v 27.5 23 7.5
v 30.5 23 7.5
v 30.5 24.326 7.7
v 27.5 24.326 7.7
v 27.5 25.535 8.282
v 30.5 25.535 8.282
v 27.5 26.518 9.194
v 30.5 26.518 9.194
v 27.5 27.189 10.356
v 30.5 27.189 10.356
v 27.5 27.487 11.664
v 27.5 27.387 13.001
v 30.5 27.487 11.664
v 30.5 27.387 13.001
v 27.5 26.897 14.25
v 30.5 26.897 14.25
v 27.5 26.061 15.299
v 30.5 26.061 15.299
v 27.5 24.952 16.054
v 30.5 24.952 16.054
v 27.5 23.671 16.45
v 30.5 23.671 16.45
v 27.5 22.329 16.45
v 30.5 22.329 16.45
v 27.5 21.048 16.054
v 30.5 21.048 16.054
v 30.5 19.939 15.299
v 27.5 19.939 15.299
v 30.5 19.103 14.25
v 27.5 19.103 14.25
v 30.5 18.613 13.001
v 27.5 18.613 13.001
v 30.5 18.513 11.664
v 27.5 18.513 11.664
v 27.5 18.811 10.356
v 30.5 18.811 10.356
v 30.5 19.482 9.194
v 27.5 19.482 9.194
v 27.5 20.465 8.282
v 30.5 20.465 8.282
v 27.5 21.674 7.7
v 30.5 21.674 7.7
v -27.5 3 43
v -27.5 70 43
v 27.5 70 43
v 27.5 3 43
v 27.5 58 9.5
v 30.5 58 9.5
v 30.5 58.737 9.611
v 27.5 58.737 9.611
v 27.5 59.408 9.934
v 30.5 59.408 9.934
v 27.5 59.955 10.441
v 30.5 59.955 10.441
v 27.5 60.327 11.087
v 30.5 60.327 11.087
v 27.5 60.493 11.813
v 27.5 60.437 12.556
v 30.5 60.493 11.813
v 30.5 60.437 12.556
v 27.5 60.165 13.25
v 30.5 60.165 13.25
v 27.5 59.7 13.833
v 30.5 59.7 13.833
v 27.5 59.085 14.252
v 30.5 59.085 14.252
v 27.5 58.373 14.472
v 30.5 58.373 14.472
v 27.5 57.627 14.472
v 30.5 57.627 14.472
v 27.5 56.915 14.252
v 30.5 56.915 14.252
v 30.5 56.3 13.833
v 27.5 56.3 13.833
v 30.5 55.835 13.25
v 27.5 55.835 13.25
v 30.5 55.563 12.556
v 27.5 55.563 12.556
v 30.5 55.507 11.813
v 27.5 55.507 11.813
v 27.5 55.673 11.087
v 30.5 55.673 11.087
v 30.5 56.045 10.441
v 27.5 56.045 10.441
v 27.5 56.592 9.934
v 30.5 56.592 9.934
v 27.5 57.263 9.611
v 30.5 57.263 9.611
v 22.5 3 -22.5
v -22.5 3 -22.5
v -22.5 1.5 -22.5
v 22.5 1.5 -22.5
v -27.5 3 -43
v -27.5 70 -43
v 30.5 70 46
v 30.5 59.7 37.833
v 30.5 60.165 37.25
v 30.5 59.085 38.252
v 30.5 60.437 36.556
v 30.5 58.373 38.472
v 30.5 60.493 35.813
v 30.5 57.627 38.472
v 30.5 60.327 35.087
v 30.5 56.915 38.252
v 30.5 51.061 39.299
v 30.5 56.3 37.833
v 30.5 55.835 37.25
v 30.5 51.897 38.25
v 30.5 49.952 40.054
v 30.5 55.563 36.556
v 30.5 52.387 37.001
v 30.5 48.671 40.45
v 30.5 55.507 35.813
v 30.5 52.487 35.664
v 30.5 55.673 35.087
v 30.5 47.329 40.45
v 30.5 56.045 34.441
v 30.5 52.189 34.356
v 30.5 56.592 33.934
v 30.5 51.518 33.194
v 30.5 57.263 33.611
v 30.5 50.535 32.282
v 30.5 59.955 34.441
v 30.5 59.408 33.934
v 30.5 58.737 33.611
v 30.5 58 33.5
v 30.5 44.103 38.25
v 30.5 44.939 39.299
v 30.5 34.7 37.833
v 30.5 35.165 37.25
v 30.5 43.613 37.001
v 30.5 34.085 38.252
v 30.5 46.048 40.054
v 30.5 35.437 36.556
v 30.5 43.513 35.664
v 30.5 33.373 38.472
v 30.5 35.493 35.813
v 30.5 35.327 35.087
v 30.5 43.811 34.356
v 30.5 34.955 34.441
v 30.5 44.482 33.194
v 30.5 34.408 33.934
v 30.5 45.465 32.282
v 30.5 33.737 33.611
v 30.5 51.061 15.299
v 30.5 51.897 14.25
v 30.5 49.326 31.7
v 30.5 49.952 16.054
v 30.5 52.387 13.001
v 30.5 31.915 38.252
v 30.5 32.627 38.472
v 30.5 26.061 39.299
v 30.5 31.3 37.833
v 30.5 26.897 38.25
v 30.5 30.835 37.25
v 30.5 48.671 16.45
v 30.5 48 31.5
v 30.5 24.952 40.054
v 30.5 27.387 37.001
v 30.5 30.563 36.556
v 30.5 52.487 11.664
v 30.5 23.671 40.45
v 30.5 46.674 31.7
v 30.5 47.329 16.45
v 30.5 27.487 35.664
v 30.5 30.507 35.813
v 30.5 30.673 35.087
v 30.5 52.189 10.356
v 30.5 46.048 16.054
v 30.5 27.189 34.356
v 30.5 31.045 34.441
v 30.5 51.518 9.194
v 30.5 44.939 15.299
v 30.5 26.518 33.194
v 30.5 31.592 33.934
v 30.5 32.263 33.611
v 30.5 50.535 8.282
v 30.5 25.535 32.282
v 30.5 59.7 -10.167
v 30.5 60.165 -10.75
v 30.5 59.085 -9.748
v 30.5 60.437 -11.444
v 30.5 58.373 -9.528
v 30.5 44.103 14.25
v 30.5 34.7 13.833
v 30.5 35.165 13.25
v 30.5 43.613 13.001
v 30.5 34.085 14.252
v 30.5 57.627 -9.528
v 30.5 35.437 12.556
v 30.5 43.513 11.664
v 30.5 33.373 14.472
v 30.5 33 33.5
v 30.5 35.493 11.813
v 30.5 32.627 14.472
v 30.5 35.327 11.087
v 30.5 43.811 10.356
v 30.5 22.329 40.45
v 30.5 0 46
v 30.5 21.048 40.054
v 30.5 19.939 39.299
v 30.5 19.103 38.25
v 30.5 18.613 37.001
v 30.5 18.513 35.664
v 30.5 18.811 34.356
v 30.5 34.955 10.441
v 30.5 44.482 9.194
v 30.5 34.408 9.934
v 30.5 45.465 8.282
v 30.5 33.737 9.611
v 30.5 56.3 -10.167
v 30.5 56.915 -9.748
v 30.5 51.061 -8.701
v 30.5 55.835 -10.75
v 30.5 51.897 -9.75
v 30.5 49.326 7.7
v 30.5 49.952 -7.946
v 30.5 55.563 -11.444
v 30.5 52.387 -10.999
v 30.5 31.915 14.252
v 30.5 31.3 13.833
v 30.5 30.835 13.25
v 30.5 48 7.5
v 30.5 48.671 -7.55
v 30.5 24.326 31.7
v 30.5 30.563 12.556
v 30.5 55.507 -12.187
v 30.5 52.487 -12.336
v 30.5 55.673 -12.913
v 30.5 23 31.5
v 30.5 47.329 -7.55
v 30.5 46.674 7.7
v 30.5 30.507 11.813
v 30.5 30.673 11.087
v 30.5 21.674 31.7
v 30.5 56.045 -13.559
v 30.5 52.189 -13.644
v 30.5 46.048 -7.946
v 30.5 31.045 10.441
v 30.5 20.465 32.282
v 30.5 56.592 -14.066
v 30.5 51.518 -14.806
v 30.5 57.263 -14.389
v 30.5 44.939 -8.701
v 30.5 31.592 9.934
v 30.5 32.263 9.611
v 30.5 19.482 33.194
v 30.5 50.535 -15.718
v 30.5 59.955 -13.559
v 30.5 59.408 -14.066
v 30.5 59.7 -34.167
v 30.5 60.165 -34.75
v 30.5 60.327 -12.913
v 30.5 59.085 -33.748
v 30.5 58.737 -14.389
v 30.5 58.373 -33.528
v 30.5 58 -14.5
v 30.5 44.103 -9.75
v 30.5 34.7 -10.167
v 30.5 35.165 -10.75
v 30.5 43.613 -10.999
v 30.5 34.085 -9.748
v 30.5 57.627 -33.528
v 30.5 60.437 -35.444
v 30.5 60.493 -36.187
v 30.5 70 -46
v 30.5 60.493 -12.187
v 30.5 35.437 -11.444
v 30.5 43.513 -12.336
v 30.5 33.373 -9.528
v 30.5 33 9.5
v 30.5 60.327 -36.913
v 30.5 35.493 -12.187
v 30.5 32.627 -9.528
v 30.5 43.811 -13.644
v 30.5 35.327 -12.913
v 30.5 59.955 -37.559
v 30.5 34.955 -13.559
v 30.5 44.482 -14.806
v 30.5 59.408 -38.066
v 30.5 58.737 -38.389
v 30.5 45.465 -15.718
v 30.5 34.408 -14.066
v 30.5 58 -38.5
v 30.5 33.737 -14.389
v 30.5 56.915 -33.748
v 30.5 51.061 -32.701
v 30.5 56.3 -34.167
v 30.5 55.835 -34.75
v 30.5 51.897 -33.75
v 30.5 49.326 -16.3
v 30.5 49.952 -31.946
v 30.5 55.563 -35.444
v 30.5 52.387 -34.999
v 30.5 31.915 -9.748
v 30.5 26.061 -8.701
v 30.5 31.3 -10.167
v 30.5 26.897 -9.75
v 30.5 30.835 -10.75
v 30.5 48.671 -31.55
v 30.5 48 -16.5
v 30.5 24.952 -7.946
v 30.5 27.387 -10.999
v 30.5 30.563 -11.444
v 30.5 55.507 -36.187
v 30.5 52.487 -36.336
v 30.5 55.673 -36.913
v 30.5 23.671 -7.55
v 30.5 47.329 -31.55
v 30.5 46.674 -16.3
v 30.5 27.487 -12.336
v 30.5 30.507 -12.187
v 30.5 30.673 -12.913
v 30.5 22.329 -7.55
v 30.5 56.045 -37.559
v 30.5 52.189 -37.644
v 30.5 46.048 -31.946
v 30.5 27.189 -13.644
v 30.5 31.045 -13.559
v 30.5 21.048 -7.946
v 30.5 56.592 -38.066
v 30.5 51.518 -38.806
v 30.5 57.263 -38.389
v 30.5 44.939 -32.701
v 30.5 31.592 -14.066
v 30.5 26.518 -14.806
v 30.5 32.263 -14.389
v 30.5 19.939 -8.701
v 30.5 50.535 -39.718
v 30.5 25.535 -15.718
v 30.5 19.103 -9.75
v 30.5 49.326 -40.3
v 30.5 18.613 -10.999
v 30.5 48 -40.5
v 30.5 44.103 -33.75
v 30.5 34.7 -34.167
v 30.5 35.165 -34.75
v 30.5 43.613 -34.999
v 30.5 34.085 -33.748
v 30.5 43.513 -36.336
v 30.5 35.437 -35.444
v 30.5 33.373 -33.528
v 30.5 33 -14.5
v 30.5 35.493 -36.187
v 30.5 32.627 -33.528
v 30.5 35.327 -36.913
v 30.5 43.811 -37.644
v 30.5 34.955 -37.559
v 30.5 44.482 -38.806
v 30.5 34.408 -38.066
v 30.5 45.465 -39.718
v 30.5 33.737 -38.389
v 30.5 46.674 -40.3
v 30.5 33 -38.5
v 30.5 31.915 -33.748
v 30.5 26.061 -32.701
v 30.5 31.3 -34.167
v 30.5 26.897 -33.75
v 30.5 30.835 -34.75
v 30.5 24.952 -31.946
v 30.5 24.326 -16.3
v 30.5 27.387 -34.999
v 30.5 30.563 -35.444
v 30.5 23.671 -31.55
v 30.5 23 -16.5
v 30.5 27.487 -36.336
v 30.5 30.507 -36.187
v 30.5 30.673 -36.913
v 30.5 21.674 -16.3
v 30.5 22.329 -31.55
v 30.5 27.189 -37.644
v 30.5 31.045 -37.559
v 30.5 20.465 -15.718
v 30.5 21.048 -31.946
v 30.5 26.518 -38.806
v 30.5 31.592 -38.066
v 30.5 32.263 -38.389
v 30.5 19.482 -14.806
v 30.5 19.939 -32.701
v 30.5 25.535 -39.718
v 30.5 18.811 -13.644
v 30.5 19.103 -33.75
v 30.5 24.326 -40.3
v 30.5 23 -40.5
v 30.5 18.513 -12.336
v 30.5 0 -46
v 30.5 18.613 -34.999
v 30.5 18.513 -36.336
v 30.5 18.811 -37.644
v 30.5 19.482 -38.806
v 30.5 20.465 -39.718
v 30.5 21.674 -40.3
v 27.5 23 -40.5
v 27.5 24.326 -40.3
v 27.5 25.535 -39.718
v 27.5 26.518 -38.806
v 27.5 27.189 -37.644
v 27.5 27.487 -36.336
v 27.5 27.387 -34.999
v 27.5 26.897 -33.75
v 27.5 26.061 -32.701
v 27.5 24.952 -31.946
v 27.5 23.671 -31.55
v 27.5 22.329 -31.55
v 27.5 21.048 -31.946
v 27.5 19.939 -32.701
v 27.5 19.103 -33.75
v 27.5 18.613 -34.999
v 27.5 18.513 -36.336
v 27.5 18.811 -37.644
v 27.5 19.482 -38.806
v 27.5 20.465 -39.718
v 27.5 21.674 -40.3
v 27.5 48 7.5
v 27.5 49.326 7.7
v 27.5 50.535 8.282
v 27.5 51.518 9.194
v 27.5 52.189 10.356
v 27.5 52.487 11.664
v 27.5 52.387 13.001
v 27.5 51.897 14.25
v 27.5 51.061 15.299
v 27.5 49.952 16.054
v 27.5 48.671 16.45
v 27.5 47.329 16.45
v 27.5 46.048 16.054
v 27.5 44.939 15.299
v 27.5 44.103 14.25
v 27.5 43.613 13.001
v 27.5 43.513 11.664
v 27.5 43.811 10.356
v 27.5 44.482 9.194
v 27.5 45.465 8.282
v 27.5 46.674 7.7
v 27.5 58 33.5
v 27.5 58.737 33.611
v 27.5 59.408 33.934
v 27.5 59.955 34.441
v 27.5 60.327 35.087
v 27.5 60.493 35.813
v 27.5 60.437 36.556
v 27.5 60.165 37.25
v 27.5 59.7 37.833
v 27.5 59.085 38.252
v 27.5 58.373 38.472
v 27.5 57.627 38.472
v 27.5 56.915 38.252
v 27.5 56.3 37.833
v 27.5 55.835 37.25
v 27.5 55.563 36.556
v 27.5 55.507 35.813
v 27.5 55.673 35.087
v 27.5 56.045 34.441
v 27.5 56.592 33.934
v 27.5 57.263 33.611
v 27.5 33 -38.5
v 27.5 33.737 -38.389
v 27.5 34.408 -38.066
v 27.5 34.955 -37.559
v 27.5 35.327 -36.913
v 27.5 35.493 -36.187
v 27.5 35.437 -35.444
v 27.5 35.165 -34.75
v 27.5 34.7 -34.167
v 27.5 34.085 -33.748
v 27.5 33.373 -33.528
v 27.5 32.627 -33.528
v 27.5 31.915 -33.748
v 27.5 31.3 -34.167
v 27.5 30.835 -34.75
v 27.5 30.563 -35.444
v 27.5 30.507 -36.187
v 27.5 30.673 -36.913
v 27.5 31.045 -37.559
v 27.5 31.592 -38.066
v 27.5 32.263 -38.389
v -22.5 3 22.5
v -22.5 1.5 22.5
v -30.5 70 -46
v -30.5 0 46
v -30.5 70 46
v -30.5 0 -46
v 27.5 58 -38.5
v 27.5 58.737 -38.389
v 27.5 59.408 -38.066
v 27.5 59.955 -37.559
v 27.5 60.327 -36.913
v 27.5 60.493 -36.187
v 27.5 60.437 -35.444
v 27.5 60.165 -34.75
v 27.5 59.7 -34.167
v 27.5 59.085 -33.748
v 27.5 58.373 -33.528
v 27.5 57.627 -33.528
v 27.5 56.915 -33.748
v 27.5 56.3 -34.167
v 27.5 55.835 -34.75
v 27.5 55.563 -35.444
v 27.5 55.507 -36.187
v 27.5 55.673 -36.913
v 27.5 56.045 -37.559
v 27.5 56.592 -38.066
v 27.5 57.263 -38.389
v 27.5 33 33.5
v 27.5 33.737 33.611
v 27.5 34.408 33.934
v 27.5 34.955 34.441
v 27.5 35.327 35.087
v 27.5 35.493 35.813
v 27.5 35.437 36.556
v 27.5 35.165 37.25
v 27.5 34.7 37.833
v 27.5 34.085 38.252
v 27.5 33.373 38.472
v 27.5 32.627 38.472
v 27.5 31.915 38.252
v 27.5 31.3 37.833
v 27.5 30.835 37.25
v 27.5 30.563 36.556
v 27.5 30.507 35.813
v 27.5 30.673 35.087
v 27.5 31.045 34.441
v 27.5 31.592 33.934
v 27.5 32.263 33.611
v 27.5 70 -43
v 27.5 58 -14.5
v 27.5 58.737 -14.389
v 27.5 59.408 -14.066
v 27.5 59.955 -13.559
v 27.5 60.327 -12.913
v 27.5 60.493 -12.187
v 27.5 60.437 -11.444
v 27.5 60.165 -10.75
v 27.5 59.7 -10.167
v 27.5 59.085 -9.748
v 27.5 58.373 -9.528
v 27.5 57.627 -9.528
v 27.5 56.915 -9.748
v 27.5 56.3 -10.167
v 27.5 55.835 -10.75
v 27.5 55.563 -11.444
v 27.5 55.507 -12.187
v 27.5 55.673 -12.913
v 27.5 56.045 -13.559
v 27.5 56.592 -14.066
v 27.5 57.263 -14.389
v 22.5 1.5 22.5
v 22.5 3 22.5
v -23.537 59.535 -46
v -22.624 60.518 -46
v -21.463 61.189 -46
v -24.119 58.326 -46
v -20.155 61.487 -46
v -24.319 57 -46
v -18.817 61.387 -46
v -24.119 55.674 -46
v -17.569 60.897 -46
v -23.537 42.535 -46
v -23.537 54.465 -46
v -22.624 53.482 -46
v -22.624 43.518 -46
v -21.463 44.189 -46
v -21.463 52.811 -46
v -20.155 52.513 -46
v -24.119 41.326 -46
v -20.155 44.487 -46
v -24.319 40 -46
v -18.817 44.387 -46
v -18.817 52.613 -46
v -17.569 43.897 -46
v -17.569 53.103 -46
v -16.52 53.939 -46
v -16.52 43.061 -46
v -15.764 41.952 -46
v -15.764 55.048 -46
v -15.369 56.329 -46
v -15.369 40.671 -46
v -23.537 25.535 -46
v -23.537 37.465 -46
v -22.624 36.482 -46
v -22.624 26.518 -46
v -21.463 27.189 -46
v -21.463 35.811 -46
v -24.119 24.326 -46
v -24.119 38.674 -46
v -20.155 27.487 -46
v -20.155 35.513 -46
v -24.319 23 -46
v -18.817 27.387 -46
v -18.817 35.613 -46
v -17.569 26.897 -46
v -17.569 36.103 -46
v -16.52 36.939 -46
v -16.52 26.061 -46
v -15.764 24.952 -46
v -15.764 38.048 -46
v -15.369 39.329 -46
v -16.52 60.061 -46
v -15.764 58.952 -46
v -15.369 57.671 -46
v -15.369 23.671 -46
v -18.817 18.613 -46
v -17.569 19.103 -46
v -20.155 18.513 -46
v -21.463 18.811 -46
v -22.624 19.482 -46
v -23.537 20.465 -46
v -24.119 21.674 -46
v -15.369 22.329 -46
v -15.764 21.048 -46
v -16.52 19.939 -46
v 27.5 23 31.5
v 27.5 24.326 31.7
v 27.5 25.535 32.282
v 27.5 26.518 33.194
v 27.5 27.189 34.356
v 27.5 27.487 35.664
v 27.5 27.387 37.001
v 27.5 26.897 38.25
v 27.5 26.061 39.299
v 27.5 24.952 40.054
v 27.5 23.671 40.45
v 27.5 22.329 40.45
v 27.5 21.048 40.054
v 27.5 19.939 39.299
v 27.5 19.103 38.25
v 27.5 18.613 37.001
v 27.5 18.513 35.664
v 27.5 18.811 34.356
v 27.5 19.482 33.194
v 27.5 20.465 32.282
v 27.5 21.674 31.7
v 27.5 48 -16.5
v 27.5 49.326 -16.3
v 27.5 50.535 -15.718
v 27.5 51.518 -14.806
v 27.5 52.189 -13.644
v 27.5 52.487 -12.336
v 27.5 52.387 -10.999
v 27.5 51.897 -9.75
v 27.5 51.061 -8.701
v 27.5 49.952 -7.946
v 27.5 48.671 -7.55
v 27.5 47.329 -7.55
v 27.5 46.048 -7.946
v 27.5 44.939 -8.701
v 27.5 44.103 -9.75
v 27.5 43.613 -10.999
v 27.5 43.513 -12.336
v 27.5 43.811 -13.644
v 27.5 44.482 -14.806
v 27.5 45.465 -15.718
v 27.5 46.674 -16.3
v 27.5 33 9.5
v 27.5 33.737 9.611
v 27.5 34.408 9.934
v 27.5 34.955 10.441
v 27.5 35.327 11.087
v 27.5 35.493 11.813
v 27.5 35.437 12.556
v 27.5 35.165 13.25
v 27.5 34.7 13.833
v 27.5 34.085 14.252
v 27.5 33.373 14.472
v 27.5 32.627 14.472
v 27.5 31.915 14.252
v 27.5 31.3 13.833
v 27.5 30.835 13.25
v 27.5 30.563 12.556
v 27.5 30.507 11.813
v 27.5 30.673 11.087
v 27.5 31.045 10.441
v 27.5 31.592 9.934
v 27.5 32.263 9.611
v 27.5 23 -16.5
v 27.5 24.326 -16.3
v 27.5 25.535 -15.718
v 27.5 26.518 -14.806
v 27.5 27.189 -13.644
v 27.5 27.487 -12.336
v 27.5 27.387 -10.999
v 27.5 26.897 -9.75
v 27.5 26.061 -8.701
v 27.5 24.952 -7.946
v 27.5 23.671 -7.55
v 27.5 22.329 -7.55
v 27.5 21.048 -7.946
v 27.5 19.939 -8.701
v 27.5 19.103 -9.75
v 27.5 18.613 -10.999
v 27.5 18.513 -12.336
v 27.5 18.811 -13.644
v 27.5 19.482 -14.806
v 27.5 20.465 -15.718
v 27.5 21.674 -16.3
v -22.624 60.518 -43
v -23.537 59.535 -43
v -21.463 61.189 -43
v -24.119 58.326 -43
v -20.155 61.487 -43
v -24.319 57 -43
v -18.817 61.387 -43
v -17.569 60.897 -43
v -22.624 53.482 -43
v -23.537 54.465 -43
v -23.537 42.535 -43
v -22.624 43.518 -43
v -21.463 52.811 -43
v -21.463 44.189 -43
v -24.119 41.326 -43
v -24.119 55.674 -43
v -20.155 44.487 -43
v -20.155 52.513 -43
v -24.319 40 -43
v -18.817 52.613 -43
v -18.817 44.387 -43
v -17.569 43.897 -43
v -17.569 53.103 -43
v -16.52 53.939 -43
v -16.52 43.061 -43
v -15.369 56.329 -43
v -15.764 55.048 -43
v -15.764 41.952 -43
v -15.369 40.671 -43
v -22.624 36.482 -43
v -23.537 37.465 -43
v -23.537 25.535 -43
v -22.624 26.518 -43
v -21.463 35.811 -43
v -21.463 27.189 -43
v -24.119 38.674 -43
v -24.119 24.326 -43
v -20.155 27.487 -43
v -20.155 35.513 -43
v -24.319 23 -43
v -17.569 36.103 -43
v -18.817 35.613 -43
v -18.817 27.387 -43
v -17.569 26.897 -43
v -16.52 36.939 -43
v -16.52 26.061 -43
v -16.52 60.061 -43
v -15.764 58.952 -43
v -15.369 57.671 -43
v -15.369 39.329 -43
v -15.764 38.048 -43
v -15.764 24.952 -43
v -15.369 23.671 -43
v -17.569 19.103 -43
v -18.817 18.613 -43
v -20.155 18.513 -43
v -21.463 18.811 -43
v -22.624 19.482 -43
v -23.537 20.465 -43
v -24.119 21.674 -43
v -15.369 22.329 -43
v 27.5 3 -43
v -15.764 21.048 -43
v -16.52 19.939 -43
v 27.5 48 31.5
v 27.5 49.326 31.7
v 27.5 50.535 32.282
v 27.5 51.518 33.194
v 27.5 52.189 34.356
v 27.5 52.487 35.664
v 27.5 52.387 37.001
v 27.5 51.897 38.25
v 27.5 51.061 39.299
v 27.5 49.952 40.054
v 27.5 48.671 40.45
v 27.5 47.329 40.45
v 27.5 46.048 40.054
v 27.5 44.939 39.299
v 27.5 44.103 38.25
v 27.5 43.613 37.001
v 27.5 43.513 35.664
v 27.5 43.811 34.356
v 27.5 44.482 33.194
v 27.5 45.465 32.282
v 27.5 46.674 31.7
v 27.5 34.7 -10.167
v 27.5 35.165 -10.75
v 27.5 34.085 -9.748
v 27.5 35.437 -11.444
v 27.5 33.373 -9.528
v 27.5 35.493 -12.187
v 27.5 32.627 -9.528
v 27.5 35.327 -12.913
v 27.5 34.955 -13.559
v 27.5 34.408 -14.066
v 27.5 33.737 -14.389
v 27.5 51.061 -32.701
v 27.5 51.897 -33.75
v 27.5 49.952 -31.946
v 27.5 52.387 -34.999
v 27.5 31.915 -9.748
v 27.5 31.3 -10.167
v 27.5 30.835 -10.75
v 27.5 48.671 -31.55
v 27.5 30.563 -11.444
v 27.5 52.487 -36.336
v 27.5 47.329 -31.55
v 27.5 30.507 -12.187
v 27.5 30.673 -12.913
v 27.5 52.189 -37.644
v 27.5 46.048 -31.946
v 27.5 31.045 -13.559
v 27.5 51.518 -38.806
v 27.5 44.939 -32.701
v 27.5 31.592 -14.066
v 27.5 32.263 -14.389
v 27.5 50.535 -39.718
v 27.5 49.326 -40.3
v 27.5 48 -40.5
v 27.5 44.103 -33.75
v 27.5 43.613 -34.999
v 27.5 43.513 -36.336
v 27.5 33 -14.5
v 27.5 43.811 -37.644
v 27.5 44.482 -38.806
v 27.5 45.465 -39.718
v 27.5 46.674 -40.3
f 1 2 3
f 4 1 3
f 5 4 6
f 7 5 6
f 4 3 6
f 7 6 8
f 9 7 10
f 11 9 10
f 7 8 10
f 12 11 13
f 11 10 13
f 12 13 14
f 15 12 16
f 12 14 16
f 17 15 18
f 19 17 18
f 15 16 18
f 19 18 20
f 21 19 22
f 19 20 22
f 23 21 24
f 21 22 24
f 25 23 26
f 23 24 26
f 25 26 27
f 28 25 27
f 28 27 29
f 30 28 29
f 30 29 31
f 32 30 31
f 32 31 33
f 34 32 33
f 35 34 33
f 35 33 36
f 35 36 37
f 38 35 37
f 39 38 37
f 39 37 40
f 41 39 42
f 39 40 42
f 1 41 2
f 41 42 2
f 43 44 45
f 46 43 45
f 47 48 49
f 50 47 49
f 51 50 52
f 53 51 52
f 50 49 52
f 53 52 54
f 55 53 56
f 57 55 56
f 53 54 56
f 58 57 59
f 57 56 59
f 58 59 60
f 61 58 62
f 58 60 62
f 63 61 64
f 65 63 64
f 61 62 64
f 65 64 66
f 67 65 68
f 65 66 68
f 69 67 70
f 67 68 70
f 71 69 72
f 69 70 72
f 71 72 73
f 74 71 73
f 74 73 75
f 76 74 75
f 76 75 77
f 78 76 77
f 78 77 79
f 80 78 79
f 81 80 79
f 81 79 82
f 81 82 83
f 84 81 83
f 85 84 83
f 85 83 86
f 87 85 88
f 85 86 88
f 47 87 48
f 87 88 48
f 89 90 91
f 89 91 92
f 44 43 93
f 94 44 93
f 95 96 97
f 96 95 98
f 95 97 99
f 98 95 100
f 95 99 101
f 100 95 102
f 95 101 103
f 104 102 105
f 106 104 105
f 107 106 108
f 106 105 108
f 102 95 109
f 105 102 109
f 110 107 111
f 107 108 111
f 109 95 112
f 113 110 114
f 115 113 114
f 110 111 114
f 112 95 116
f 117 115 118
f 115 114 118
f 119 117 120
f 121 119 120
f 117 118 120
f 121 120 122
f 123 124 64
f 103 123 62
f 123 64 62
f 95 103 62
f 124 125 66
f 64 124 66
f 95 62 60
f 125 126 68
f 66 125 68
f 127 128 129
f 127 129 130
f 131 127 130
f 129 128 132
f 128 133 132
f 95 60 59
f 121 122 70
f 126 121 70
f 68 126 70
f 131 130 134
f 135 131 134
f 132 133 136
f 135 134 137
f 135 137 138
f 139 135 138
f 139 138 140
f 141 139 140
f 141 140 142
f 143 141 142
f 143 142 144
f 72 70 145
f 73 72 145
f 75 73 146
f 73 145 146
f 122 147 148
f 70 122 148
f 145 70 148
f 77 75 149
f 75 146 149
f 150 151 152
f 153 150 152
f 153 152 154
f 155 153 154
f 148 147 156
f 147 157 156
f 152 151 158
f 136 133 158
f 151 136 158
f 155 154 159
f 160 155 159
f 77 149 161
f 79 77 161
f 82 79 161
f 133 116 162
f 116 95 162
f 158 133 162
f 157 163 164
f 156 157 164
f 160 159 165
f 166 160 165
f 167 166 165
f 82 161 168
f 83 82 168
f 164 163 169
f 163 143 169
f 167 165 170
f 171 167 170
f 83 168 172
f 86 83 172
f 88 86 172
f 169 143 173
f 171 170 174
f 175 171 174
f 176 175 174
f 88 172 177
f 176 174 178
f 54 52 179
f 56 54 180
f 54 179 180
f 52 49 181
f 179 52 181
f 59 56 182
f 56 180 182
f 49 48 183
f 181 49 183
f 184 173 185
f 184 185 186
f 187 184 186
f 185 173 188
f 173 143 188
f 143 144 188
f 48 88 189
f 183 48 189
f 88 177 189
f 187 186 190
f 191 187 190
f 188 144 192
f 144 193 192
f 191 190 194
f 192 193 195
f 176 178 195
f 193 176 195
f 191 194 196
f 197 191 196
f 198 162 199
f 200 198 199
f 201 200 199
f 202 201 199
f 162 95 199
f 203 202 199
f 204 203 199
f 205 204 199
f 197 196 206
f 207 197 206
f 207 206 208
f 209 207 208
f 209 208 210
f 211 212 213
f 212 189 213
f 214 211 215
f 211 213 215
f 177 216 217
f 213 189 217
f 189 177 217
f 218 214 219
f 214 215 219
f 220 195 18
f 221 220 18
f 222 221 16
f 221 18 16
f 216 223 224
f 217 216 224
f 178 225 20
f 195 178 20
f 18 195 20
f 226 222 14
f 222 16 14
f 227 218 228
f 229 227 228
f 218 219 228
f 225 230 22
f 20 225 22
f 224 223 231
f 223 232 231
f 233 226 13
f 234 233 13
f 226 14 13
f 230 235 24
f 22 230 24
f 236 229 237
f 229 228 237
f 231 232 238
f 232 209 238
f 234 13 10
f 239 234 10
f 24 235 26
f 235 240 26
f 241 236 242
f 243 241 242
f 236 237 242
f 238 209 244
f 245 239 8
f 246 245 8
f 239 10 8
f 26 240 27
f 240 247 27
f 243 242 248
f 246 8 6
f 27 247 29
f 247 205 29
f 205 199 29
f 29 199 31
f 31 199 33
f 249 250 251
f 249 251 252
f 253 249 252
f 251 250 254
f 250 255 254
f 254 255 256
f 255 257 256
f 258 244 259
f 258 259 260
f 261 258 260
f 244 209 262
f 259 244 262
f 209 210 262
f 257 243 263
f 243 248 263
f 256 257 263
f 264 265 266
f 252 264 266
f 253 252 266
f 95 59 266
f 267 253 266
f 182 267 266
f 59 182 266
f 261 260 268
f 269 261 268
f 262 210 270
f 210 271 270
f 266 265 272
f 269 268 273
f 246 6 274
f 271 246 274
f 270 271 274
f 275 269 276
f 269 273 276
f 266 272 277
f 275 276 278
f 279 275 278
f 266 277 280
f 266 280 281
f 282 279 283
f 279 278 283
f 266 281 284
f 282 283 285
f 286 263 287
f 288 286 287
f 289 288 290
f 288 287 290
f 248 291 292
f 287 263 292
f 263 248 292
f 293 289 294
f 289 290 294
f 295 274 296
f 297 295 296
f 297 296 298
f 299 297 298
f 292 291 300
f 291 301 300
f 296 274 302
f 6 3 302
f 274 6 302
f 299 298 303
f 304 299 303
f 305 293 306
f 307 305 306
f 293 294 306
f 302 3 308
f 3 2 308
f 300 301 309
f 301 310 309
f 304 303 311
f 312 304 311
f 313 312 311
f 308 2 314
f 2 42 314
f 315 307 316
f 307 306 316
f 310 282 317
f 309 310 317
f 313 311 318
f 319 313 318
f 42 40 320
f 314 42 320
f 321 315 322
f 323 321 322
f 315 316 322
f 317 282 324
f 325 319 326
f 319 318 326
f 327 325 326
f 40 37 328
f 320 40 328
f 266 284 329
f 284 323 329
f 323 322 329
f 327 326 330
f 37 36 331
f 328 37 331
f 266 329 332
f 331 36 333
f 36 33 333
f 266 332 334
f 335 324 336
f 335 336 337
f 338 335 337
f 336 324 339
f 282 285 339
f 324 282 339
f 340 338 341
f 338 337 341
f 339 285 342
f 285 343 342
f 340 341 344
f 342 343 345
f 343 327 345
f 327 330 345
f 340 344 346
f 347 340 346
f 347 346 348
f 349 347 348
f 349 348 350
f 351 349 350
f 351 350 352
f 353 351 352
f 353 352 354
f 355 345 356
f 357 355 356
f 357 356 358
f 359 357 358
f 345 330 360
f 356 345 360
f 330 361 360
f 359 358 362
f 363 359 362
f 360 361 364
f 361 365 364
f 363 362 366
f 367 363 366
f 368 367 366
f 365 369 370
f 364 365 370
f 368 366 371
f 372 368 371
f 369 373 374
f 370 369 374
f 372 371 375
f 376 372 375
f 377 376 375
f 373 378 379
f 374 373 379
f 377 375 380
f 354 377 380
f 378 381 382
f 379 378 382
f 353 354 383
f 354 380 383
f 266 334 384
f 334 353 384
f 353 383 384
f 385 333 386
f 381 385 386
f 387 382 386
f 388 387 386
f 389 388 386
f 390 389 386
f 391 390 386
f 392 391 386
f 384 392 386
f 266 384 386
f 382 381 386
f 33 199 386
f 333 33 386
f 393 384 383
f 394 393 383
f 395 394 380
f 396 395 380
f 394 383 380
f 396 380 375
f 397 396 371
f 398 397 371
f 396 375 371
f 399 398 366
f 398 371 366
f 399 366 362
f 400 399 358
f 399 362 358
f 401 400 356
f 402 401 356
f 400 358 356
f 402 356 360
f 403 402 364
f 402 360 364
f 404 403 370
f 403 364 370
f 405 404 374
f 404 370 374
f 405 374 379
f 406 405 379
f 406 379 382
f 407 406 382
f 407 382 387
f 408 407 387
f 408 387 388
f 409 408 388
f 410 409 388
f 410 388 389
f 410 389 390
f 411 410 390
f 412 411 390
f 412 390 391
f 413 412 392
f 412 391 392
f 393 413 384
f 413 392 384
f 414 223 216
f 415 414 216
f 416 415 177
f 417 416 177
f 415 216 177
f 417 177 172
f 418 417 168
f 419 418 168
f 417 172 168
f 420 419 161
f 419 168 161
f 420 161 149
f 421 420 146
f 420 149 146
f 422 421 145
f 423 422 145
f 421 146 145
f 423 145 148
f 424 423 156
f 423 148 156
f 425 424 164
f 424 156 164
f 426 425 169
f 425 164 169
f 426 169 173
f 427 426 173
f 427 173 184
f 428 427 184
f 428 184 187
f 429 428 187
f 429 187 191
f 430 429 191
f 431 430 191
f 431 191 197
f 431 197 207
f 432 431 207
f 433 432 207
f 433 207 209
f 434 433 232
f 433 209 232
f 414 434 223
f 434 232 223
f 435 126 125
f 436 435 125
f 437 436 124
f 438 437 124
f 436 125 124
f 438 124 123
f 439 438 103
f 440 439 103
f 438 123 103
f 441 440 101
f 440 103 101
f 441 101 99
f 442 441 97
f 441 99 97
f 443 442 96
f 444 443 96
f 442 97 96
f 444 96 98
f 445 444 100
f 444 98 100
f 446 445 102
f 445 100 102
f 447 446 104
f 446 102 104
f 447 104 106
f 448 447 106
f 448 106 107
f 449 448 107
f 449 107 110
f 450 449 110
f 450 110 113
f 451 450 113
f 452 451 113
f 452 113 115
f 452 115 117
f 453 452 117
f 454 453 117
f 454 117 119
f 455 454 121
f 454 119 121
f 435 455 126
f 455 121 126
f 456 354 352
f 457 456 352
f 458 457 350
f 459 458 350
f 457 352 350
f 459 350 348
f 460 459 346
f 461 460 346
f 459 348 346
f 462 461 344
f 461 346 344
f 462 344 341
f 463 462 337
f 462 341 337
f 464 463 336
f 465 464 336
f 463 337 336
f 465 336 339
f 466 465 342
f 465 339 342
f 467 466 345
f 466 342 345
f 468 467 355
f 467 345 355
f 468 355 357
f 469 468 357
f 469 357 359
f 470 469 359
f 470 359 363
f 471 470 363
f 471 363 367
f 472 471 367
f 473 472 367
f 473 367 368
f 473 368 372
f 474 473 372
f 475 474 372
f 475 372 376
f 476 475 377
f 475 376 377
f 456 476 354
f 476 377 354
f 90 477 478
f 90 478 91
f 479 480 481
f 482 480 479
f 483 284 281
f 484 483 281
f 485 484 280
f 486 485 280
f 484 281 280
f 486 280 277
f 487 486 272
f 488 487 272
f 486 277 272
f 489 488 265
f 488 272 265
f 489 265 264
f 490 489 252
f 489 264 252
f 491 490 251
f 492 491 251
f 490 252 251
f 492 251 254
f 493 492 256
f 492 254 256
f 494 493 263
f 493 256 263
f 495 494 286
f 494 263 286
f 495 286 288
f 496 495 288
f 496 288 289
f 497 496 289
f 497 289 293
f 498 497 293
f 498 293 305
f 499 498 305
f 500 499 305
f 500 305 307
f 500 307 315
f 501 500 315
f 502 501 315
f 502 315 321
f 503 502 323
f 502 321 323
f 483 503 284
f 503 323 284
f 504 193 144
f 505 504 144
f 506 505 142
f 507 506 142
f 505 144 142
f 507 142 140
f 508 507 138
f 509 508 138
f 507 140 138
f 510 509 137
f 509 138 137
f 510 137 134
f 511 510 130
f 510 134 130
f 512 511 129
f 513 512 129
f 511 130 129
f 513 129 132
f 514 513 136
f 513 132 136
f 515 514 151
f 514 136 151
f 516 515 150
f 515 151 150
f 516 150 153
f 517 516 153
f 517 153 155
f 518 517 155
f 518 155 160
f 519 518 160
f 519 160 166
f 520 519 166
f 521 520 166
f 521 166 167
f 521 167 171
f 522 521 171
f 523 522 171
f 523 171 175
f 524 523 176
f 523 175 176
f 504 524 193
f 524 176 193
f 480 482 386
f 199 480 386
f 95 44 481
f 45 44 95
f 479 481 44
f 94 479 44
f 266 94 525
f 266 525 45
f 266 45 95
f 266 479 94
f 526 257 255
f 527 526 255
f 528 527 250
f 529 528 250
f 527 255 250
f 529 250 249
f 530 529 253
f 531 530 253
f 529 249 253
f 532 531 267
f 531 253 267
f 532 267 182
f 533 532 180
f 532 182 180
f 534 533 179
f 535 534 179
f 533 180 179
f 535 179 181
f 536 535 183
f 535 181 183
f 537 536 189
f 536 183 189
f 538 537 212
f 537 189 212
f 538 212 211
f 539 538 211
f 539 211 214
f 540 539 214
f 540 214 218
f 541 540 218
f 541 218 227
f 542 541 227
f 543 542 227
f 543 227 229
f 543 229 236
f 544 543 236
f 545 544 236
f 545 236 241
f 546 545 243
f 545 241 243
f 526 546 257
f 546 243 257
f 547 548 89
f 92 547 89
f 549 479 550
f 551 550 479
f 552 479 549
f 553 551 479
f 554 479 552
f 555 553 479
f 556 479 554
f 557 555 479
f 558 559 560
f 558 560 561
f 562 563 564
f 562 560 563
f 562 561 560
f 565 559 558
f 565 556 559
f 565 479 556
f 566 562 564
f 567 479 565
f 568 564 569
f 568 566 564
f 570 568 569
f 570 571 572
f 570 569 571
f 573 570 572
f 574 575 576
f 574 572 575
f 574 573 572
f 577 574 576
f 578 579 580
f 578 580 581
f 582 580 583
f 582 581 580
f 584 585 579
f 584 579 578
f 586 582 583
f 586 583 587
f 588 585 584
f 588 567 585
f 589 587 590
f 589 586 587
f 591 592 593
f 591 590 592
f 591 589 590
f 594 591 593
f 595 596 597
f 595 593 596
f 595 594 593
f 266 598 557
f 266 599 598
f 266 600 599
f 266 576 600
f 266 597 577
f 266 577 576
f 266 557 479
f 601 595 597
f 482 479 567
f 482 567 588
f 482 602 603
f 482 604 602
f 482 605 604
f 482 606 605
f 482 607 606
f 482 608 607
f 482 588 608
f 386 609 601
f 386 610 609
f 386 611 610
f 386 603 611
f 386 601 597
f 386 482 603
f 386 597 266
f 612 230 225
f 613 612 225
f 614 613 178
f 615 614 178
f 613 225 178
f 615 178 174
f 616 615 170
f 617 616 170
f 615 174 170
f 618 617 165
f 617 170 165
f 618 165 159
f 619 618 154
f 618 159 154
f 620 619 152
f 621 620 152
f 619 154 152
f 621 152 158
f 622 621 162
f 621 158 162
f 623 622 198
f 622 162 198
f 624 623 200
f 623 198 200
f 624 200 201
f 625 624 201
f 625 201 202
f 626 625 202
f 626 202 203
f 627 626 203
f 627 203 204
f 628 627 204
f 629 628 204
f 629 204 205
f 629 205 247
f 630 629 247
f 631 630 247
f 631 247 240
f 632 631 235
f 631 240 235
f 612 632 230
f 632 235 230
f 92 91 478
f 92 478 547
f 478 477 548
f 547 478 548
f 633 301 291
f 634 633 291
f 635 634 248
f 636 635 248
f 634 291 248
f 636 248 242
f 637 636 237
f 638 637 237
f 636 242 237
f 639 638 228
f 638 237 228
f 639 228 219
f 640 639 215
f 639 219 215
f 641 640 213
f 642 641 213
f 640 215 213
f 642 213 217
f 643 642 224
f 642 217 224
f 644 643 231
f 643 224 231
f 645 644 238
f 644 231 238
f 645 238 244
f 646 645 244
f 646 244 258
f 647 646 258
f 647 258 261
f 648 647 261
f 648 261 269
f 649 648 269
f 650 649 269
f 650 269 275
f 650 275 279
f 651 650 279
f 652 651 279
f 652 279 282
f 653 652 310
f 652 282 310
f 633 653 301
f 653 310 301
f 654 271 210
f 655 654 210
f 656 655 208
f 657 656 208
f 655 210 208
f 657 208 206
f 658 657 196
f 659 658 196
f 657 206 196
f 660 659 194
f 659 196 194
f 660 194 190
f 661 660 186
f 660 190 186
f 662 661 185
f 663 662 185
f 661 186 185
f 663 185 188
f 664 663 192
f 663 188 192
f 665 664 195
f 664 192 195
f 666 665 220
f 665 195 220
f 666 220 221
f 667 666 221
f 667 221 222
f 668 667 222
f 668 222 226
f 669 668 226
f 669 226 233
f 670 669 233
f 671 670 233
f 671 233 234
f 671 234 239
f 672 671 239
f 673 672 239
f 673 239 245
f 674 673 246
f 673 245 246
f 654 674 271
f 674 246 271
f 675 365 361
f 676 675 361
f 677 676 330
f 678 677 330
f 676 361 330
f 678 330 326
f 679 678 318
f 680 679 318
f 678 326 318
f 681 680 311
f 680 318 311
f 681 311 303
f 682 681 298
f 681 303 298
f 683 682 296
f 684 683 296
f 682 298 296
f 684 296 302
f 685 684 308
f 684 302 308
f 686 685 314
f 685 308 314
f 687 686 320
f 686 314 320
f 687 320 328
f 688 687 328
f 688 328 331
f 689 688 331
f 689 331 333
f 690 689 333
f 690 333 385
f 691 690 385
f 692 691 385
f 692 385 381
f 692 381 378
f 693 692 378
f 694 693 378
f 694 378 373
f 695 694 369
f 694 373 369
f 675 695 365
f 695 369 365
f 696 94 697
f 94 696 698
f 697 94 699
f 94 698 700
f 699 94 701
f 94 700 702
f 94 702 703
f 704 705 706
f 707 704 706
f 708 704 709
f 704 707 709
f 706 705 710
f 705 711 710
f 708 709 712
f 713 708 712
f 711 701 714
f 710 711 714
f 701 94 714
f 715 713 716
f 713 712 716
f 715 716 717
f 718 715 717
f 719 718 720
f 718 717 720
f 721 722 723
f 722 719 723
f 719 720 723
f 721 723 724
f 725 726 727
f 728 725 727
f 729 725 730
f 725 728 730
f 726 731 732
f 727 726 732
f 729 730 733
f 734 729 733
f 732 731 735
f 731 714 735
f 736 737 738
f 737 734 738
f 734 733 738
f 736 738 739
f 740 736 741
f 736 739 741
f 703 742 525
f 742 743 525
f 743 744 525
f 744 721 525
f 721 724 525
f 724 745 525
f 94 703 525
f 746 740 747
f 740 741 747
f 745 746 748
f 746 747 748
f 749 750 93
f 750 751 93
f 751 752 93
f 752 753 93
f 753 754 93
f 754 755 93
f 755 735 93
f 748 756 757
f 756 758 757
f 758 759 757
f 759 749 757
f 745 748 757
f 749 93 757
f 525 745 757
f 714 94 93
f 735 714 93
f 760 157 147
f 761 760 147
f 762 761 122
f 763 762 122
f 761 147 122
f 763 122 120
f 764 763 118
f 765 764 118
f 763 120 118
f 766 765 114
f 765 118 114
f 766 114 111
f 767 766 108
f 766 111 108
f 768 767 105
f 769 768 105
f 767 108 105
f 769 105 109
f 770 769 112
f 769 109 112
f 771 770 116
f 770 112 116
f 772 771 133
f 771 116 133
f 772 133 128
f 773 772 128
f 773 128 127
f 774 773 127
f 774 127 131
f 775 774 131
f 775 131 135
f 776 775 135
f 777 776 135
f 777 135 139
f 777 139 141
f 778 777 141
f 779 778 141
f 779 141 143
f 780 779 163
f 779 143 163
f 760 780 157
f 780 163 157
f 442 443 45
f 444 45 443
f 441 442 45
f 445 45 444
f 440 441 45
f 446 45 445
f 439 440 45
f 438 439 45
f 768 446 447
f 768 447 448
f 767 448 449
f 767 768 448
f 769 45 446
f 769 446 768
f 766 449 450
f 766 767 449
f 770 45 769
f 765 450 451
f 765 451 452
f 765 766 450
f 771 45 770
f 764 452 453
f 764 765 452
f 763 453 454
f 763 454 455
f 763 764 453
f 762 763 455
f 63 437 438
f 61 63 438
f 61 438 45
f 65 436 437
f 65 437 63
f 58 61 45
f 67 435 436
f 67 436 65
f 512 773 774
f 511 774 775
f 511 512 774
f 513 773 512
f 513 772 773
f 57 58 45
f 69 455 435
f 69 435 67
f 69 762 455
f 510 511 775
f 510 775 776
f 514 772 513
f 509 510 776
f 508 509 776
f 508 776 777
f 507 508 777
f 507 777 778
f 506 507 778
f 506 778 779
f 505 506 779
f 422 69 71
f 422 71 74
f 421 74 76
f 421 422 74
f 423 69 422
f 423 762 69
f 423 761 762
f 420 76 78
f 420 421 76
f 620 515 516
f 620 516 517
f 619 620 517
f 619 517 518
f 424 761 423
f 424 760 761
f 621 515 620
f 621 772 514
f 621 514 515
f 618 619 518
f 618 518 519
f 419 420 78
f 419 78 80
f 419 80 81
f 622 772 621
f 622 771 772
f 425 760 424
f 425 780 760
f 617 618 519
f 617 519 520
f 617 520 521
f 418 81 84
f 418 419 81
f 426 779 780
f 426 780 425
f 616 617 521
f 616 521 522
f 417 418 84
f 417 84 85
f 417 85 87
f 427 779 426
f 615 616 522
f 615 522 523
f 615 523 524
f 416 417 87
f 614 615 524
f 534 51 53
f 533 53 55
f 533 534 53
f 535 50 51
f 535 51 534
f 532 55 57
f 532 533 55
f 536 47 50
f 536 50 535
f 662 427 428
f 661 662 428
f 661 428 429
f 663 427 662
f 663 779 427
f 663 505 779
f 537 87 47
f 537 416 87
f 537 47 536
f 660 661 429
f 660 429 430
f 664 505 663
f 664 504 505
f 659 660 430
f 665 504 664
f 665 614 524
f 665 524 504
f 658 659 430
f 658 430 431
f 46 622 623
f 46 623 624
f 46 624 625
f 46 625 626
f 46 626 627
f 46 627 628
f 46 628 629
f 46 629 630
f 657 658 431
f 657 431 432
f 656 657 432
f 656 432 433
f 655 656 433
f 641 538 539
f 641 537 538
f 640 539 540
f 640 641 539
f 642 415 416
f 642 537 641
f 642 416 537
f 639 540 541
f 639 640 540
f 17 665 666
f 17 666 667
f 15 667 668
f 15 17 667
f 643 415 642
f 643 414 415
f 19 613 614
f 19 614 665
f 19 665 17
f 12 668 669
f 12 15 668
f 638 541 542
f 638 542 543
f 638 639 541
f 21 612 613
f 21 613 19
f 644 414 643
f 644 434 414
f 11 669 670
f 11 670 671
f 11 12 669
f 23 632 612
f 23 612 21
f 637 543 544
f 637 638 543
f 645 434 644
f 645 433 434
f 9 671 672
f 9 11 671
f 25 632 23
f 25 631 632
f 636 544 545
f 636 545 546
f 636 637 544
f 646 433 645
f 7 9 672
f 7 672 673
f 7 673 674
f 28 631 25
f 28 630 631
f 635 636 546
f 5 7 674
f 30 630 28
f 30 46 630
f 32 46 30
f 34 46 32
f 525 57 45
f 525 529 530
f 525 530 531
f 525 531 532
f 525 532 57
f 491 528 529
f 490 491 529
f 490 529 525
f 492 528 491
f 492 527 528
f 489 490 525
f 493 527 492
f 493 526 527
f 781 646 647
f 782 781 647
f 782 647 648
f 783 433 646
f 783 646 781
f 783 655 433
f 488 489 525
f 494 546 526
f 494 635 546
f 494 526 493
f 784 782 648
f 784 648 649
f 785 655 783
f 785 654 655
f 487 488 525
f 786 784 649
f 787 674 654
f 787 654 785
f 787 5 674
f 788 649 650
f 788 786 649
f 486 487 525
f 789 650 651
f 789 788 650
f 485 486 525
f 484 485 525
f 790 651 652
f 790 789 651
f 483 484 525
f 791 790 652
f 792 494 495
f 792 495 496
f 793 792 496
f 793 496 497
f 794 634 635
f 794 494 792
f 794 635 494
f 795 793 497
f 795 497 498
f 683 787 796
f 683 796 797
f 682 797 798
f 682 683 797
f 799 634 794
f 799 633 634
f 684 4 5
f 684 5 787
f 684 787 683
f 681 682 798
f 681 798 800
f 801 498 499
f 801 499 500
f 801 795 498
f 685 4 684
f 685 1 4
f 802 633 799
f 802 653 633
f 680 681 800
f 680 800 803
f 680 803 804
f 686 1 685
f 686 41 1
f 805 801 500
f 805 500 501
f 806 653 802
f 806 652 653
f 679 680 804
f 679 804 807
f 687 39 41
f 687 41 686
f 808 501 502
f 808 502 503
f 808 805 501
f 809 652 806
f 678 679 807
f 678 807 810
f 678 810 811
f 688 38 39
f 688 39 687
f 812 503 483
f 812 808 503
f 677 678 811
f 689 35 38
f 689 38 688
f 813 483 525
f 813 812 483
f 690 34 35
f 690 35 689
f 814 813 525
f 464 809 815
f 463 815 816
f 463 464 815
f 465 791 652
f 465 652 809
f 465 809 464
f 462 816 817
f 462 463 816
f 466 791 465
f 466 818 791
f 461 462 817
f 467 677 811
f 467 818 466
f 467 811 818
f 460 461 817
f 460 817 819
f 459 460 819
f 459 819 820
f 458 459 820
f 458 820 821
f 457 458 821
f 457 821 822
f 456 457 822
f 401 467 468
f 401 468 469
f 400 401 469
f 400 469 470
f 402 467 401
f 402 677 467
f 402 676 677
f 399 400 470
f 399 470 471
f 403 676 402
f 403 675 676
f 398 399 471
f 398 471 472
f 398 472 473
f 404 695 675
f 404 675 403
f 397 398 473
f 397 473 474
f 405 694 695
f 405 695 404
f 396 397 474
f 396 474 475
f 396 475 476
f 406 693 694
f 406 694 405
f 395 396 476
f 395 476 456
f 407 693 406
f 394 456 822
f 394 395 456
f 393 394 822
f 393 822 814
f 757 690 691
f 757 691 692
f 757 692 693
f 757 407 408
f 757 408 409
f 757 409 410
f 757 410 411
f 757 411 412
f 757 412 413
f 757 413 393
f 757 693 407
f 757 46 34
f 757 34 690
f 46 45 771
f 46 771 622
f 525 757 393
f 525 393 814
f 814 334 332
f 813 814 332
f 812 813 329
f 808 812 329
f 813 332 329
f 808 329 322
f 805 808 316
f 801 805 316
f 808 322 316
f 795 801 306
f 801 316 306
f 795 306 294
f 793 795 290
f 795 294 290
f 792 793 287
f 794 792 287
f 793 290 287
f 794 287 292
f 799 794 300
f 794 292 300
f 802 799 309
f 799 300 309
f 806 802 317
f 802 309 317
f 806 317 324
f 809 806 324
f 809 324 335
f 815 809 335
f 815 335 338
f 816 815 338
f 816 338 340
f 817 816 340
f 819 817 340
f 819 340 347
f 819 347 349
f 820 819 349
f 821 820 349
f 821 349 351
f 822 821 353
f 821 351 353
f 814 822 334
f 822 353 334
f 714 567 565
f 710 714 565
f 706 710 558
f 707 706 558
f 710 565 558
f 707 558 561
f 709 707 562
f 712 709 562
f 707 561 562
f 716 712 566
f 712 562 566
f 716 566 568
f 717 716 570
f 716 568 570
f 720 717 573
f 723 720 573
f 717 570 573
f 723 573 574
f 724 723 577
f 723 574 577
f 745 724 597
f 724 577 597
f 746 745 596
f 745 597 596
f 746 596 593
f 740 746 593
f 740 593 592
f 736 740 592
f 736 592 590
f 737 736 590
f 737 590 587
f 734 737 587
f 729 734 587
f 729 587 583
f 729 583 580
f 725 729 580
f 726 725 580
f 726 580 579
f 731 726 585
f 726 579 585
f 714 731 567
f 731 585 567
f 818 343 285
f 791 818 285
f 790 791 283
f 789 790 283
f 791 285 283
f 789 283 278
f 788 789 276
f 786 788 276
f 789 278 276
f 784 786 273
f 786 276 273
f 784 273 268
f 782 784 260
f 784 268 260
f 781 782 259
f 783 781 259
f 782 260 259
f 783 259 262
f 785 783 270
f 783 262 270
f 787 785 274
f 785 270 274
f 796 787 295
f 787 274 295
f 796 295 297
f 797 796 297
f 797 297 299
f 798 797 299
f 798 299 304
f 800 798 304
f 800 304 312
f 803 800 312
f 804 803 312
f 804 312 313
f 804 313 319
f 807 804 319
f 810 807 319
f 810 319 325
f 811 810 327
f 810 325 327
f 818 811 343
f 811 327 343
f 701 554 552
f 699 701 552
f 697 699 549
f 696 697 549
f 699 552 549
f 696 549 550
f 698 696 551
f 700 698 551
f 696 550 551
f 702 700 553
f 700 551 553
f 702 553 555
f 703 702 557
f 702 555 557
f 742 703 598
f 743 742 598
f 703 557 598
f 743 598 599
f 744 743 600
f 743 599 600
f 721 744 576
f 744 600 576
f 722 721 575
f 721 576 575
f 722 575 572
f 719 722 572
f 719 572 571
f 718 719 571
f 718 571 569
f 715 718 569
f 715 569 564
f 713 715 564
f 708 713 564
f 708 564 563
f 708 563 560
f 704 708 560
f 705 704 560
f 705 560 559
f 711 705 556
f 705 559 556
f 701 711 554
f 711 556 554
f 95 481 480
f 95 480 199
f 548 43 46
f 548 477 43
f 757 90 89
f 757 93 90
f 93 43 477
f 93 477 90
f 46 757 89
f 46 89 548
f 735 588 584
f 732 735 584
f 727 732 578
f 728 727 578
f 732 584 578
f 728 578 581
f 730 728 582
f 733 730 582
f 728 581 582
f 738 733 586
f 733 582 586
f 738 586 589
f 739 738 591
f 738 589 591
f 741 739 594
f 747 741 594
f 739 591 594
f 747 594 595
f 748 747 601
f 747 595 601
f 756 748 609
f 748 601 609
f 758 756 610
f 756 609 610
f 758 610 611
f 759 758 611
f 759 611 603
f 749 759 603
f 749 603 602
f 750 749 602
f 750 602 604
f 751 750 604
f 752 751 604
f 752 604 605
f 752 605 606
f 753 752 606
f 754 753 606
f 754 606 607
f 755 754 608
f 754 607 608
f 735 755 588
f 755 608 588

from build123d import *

# Parameters (mm, degrees)
SKETCH1_W           = 55
SKETCH1_H           = 86
BOSS_EXTRUDE1_DEPTH = 3
SKETCH2_W           = 45
SKETCH2_H           = 45
CUT_EXTRUDE1_DEPTH  = 1.5
SKETCH3_W           = 61
SKETCH3_H           = 92
SKETCH3_W_2         = 55
SKETCH3_H_2         = 86
BOSS_EXTRUDE2_DEPTH = 70
SKETCH4_R           = 4.5
SKETCH4_R_2         = 2.5
CUT_EXTRUDE2_DEPTH  = 3
SKETCH5_R           = 4.5
CUT_EXTRUDE3_DEPTH  = 3


with BuildPart() as part:
    # Sketch1 → Boss-Extrude1 (new body)
    with BuildSketch(Plane(origin=(0, 0, 0), x_dir=(1, 0, 0), z_dir=(0, 1, 0))):
        Rectangle(SKETCH1_W, SKETCH1_H)
    extrude(amount=BOSS_EXTRUDE1_DEPTH)

    # Sketch2 → Cut-Extrude1 (cut)
    with BuildSketch(Plane(origin=(0, 3, 0), x_dir=(1, 0, 0), z_dir=(0, 1, 0))):
        Rectangle(SKETCH2_W, SKETCH2_H)
    extrude(amount=-CUT_EXTRUDE1_DEPTH, mode=Mode.SUBTRACT)

    # Sketch3 → Boss-Extrude2 (add)
    with BuildSketch(Plane(origin=(0, 0, 0), x_dir=(1, 0, 0), z_dir=(0, 1, 0))):
        Rectangle(SKETCH3_W, SKETCH3_H)
        Rectangle(SKETCH3_W_2, SKETCH3_H_2, mode=Mode.SUBTRACT)
    extrude(amount=BOSS_EXTRUDE2_DEPTH)

    # Sketch4 → Cut-Extrude2 (cut)
    with BuildSketch(Plane(origin=(30.5, 0, 0), x_dir=(0, 0, -1), z_dir=(1, 0, 0))):
        with Locations((-36, 48)):
            Circle(SKETCH4_R)
        with Locations((-12, 48)):
            Circle(SKETCH4_R)
        with Locations((12, 48)):
            Circle(SKETCH4_R)
        with Locations((36, 48)):
            Circle(SKETCH4_R)
        with Locations((36, 23)):
            Circle(SKETCH4_R)
        with Locations((12, 23)):
            Circle(SKETCH4_R)
        with Locations((-12, 23)):
            Circle(SKETCH4_R)
        with Locations((-36, 23)):
            Circle(SKETCH4_R)
        with Locations((-36, 33)):
            Circle(SKETCH4_R_2)
        with Locations((-12, 33)):
            Circle(SKETCH4_R_2)
        with Locations((12, 33)):
            Circle(SKETCH4_R_2)
        with Locations((36, 33)):
            Circle(SKETCH4_R_2)
        with Locations((36, 58)):
            Circle(SKETCH4_R_2)
        with Locations((12, 58)):
            Circle(SKETCH4_R_2)
        with Locations((-12, 58)):
            Circle(SKETCH4_R_2)
        with Locations((-36, 58)):
            Circle(SKETCH4_R_2)
    extrude(amount=-CUT_EXTRUDE2_DEPTH, mode=Mode.SUBTRACT)

    # Sketch5 → Cut-Extrude3 (cut)
    with BuildSketch(Plane(origin=(0, 0, -46), x_dir=(-1, 0, 0), z_dir=(0, 0, -1))):
        with Locations((19.818640834, 23)):
            Circle(SKETCH5_R)
        with Locations((19.818640834, 40)):
            Circle(SKETCH5_R)
        with Locations((19.818640834, 57)):
            Circle(SKETCH5_R)
    extrude(amount=-CUT_EXTRUDE3_DEPTH, mode=Mode.SUBTRACT)


solid = part.part
